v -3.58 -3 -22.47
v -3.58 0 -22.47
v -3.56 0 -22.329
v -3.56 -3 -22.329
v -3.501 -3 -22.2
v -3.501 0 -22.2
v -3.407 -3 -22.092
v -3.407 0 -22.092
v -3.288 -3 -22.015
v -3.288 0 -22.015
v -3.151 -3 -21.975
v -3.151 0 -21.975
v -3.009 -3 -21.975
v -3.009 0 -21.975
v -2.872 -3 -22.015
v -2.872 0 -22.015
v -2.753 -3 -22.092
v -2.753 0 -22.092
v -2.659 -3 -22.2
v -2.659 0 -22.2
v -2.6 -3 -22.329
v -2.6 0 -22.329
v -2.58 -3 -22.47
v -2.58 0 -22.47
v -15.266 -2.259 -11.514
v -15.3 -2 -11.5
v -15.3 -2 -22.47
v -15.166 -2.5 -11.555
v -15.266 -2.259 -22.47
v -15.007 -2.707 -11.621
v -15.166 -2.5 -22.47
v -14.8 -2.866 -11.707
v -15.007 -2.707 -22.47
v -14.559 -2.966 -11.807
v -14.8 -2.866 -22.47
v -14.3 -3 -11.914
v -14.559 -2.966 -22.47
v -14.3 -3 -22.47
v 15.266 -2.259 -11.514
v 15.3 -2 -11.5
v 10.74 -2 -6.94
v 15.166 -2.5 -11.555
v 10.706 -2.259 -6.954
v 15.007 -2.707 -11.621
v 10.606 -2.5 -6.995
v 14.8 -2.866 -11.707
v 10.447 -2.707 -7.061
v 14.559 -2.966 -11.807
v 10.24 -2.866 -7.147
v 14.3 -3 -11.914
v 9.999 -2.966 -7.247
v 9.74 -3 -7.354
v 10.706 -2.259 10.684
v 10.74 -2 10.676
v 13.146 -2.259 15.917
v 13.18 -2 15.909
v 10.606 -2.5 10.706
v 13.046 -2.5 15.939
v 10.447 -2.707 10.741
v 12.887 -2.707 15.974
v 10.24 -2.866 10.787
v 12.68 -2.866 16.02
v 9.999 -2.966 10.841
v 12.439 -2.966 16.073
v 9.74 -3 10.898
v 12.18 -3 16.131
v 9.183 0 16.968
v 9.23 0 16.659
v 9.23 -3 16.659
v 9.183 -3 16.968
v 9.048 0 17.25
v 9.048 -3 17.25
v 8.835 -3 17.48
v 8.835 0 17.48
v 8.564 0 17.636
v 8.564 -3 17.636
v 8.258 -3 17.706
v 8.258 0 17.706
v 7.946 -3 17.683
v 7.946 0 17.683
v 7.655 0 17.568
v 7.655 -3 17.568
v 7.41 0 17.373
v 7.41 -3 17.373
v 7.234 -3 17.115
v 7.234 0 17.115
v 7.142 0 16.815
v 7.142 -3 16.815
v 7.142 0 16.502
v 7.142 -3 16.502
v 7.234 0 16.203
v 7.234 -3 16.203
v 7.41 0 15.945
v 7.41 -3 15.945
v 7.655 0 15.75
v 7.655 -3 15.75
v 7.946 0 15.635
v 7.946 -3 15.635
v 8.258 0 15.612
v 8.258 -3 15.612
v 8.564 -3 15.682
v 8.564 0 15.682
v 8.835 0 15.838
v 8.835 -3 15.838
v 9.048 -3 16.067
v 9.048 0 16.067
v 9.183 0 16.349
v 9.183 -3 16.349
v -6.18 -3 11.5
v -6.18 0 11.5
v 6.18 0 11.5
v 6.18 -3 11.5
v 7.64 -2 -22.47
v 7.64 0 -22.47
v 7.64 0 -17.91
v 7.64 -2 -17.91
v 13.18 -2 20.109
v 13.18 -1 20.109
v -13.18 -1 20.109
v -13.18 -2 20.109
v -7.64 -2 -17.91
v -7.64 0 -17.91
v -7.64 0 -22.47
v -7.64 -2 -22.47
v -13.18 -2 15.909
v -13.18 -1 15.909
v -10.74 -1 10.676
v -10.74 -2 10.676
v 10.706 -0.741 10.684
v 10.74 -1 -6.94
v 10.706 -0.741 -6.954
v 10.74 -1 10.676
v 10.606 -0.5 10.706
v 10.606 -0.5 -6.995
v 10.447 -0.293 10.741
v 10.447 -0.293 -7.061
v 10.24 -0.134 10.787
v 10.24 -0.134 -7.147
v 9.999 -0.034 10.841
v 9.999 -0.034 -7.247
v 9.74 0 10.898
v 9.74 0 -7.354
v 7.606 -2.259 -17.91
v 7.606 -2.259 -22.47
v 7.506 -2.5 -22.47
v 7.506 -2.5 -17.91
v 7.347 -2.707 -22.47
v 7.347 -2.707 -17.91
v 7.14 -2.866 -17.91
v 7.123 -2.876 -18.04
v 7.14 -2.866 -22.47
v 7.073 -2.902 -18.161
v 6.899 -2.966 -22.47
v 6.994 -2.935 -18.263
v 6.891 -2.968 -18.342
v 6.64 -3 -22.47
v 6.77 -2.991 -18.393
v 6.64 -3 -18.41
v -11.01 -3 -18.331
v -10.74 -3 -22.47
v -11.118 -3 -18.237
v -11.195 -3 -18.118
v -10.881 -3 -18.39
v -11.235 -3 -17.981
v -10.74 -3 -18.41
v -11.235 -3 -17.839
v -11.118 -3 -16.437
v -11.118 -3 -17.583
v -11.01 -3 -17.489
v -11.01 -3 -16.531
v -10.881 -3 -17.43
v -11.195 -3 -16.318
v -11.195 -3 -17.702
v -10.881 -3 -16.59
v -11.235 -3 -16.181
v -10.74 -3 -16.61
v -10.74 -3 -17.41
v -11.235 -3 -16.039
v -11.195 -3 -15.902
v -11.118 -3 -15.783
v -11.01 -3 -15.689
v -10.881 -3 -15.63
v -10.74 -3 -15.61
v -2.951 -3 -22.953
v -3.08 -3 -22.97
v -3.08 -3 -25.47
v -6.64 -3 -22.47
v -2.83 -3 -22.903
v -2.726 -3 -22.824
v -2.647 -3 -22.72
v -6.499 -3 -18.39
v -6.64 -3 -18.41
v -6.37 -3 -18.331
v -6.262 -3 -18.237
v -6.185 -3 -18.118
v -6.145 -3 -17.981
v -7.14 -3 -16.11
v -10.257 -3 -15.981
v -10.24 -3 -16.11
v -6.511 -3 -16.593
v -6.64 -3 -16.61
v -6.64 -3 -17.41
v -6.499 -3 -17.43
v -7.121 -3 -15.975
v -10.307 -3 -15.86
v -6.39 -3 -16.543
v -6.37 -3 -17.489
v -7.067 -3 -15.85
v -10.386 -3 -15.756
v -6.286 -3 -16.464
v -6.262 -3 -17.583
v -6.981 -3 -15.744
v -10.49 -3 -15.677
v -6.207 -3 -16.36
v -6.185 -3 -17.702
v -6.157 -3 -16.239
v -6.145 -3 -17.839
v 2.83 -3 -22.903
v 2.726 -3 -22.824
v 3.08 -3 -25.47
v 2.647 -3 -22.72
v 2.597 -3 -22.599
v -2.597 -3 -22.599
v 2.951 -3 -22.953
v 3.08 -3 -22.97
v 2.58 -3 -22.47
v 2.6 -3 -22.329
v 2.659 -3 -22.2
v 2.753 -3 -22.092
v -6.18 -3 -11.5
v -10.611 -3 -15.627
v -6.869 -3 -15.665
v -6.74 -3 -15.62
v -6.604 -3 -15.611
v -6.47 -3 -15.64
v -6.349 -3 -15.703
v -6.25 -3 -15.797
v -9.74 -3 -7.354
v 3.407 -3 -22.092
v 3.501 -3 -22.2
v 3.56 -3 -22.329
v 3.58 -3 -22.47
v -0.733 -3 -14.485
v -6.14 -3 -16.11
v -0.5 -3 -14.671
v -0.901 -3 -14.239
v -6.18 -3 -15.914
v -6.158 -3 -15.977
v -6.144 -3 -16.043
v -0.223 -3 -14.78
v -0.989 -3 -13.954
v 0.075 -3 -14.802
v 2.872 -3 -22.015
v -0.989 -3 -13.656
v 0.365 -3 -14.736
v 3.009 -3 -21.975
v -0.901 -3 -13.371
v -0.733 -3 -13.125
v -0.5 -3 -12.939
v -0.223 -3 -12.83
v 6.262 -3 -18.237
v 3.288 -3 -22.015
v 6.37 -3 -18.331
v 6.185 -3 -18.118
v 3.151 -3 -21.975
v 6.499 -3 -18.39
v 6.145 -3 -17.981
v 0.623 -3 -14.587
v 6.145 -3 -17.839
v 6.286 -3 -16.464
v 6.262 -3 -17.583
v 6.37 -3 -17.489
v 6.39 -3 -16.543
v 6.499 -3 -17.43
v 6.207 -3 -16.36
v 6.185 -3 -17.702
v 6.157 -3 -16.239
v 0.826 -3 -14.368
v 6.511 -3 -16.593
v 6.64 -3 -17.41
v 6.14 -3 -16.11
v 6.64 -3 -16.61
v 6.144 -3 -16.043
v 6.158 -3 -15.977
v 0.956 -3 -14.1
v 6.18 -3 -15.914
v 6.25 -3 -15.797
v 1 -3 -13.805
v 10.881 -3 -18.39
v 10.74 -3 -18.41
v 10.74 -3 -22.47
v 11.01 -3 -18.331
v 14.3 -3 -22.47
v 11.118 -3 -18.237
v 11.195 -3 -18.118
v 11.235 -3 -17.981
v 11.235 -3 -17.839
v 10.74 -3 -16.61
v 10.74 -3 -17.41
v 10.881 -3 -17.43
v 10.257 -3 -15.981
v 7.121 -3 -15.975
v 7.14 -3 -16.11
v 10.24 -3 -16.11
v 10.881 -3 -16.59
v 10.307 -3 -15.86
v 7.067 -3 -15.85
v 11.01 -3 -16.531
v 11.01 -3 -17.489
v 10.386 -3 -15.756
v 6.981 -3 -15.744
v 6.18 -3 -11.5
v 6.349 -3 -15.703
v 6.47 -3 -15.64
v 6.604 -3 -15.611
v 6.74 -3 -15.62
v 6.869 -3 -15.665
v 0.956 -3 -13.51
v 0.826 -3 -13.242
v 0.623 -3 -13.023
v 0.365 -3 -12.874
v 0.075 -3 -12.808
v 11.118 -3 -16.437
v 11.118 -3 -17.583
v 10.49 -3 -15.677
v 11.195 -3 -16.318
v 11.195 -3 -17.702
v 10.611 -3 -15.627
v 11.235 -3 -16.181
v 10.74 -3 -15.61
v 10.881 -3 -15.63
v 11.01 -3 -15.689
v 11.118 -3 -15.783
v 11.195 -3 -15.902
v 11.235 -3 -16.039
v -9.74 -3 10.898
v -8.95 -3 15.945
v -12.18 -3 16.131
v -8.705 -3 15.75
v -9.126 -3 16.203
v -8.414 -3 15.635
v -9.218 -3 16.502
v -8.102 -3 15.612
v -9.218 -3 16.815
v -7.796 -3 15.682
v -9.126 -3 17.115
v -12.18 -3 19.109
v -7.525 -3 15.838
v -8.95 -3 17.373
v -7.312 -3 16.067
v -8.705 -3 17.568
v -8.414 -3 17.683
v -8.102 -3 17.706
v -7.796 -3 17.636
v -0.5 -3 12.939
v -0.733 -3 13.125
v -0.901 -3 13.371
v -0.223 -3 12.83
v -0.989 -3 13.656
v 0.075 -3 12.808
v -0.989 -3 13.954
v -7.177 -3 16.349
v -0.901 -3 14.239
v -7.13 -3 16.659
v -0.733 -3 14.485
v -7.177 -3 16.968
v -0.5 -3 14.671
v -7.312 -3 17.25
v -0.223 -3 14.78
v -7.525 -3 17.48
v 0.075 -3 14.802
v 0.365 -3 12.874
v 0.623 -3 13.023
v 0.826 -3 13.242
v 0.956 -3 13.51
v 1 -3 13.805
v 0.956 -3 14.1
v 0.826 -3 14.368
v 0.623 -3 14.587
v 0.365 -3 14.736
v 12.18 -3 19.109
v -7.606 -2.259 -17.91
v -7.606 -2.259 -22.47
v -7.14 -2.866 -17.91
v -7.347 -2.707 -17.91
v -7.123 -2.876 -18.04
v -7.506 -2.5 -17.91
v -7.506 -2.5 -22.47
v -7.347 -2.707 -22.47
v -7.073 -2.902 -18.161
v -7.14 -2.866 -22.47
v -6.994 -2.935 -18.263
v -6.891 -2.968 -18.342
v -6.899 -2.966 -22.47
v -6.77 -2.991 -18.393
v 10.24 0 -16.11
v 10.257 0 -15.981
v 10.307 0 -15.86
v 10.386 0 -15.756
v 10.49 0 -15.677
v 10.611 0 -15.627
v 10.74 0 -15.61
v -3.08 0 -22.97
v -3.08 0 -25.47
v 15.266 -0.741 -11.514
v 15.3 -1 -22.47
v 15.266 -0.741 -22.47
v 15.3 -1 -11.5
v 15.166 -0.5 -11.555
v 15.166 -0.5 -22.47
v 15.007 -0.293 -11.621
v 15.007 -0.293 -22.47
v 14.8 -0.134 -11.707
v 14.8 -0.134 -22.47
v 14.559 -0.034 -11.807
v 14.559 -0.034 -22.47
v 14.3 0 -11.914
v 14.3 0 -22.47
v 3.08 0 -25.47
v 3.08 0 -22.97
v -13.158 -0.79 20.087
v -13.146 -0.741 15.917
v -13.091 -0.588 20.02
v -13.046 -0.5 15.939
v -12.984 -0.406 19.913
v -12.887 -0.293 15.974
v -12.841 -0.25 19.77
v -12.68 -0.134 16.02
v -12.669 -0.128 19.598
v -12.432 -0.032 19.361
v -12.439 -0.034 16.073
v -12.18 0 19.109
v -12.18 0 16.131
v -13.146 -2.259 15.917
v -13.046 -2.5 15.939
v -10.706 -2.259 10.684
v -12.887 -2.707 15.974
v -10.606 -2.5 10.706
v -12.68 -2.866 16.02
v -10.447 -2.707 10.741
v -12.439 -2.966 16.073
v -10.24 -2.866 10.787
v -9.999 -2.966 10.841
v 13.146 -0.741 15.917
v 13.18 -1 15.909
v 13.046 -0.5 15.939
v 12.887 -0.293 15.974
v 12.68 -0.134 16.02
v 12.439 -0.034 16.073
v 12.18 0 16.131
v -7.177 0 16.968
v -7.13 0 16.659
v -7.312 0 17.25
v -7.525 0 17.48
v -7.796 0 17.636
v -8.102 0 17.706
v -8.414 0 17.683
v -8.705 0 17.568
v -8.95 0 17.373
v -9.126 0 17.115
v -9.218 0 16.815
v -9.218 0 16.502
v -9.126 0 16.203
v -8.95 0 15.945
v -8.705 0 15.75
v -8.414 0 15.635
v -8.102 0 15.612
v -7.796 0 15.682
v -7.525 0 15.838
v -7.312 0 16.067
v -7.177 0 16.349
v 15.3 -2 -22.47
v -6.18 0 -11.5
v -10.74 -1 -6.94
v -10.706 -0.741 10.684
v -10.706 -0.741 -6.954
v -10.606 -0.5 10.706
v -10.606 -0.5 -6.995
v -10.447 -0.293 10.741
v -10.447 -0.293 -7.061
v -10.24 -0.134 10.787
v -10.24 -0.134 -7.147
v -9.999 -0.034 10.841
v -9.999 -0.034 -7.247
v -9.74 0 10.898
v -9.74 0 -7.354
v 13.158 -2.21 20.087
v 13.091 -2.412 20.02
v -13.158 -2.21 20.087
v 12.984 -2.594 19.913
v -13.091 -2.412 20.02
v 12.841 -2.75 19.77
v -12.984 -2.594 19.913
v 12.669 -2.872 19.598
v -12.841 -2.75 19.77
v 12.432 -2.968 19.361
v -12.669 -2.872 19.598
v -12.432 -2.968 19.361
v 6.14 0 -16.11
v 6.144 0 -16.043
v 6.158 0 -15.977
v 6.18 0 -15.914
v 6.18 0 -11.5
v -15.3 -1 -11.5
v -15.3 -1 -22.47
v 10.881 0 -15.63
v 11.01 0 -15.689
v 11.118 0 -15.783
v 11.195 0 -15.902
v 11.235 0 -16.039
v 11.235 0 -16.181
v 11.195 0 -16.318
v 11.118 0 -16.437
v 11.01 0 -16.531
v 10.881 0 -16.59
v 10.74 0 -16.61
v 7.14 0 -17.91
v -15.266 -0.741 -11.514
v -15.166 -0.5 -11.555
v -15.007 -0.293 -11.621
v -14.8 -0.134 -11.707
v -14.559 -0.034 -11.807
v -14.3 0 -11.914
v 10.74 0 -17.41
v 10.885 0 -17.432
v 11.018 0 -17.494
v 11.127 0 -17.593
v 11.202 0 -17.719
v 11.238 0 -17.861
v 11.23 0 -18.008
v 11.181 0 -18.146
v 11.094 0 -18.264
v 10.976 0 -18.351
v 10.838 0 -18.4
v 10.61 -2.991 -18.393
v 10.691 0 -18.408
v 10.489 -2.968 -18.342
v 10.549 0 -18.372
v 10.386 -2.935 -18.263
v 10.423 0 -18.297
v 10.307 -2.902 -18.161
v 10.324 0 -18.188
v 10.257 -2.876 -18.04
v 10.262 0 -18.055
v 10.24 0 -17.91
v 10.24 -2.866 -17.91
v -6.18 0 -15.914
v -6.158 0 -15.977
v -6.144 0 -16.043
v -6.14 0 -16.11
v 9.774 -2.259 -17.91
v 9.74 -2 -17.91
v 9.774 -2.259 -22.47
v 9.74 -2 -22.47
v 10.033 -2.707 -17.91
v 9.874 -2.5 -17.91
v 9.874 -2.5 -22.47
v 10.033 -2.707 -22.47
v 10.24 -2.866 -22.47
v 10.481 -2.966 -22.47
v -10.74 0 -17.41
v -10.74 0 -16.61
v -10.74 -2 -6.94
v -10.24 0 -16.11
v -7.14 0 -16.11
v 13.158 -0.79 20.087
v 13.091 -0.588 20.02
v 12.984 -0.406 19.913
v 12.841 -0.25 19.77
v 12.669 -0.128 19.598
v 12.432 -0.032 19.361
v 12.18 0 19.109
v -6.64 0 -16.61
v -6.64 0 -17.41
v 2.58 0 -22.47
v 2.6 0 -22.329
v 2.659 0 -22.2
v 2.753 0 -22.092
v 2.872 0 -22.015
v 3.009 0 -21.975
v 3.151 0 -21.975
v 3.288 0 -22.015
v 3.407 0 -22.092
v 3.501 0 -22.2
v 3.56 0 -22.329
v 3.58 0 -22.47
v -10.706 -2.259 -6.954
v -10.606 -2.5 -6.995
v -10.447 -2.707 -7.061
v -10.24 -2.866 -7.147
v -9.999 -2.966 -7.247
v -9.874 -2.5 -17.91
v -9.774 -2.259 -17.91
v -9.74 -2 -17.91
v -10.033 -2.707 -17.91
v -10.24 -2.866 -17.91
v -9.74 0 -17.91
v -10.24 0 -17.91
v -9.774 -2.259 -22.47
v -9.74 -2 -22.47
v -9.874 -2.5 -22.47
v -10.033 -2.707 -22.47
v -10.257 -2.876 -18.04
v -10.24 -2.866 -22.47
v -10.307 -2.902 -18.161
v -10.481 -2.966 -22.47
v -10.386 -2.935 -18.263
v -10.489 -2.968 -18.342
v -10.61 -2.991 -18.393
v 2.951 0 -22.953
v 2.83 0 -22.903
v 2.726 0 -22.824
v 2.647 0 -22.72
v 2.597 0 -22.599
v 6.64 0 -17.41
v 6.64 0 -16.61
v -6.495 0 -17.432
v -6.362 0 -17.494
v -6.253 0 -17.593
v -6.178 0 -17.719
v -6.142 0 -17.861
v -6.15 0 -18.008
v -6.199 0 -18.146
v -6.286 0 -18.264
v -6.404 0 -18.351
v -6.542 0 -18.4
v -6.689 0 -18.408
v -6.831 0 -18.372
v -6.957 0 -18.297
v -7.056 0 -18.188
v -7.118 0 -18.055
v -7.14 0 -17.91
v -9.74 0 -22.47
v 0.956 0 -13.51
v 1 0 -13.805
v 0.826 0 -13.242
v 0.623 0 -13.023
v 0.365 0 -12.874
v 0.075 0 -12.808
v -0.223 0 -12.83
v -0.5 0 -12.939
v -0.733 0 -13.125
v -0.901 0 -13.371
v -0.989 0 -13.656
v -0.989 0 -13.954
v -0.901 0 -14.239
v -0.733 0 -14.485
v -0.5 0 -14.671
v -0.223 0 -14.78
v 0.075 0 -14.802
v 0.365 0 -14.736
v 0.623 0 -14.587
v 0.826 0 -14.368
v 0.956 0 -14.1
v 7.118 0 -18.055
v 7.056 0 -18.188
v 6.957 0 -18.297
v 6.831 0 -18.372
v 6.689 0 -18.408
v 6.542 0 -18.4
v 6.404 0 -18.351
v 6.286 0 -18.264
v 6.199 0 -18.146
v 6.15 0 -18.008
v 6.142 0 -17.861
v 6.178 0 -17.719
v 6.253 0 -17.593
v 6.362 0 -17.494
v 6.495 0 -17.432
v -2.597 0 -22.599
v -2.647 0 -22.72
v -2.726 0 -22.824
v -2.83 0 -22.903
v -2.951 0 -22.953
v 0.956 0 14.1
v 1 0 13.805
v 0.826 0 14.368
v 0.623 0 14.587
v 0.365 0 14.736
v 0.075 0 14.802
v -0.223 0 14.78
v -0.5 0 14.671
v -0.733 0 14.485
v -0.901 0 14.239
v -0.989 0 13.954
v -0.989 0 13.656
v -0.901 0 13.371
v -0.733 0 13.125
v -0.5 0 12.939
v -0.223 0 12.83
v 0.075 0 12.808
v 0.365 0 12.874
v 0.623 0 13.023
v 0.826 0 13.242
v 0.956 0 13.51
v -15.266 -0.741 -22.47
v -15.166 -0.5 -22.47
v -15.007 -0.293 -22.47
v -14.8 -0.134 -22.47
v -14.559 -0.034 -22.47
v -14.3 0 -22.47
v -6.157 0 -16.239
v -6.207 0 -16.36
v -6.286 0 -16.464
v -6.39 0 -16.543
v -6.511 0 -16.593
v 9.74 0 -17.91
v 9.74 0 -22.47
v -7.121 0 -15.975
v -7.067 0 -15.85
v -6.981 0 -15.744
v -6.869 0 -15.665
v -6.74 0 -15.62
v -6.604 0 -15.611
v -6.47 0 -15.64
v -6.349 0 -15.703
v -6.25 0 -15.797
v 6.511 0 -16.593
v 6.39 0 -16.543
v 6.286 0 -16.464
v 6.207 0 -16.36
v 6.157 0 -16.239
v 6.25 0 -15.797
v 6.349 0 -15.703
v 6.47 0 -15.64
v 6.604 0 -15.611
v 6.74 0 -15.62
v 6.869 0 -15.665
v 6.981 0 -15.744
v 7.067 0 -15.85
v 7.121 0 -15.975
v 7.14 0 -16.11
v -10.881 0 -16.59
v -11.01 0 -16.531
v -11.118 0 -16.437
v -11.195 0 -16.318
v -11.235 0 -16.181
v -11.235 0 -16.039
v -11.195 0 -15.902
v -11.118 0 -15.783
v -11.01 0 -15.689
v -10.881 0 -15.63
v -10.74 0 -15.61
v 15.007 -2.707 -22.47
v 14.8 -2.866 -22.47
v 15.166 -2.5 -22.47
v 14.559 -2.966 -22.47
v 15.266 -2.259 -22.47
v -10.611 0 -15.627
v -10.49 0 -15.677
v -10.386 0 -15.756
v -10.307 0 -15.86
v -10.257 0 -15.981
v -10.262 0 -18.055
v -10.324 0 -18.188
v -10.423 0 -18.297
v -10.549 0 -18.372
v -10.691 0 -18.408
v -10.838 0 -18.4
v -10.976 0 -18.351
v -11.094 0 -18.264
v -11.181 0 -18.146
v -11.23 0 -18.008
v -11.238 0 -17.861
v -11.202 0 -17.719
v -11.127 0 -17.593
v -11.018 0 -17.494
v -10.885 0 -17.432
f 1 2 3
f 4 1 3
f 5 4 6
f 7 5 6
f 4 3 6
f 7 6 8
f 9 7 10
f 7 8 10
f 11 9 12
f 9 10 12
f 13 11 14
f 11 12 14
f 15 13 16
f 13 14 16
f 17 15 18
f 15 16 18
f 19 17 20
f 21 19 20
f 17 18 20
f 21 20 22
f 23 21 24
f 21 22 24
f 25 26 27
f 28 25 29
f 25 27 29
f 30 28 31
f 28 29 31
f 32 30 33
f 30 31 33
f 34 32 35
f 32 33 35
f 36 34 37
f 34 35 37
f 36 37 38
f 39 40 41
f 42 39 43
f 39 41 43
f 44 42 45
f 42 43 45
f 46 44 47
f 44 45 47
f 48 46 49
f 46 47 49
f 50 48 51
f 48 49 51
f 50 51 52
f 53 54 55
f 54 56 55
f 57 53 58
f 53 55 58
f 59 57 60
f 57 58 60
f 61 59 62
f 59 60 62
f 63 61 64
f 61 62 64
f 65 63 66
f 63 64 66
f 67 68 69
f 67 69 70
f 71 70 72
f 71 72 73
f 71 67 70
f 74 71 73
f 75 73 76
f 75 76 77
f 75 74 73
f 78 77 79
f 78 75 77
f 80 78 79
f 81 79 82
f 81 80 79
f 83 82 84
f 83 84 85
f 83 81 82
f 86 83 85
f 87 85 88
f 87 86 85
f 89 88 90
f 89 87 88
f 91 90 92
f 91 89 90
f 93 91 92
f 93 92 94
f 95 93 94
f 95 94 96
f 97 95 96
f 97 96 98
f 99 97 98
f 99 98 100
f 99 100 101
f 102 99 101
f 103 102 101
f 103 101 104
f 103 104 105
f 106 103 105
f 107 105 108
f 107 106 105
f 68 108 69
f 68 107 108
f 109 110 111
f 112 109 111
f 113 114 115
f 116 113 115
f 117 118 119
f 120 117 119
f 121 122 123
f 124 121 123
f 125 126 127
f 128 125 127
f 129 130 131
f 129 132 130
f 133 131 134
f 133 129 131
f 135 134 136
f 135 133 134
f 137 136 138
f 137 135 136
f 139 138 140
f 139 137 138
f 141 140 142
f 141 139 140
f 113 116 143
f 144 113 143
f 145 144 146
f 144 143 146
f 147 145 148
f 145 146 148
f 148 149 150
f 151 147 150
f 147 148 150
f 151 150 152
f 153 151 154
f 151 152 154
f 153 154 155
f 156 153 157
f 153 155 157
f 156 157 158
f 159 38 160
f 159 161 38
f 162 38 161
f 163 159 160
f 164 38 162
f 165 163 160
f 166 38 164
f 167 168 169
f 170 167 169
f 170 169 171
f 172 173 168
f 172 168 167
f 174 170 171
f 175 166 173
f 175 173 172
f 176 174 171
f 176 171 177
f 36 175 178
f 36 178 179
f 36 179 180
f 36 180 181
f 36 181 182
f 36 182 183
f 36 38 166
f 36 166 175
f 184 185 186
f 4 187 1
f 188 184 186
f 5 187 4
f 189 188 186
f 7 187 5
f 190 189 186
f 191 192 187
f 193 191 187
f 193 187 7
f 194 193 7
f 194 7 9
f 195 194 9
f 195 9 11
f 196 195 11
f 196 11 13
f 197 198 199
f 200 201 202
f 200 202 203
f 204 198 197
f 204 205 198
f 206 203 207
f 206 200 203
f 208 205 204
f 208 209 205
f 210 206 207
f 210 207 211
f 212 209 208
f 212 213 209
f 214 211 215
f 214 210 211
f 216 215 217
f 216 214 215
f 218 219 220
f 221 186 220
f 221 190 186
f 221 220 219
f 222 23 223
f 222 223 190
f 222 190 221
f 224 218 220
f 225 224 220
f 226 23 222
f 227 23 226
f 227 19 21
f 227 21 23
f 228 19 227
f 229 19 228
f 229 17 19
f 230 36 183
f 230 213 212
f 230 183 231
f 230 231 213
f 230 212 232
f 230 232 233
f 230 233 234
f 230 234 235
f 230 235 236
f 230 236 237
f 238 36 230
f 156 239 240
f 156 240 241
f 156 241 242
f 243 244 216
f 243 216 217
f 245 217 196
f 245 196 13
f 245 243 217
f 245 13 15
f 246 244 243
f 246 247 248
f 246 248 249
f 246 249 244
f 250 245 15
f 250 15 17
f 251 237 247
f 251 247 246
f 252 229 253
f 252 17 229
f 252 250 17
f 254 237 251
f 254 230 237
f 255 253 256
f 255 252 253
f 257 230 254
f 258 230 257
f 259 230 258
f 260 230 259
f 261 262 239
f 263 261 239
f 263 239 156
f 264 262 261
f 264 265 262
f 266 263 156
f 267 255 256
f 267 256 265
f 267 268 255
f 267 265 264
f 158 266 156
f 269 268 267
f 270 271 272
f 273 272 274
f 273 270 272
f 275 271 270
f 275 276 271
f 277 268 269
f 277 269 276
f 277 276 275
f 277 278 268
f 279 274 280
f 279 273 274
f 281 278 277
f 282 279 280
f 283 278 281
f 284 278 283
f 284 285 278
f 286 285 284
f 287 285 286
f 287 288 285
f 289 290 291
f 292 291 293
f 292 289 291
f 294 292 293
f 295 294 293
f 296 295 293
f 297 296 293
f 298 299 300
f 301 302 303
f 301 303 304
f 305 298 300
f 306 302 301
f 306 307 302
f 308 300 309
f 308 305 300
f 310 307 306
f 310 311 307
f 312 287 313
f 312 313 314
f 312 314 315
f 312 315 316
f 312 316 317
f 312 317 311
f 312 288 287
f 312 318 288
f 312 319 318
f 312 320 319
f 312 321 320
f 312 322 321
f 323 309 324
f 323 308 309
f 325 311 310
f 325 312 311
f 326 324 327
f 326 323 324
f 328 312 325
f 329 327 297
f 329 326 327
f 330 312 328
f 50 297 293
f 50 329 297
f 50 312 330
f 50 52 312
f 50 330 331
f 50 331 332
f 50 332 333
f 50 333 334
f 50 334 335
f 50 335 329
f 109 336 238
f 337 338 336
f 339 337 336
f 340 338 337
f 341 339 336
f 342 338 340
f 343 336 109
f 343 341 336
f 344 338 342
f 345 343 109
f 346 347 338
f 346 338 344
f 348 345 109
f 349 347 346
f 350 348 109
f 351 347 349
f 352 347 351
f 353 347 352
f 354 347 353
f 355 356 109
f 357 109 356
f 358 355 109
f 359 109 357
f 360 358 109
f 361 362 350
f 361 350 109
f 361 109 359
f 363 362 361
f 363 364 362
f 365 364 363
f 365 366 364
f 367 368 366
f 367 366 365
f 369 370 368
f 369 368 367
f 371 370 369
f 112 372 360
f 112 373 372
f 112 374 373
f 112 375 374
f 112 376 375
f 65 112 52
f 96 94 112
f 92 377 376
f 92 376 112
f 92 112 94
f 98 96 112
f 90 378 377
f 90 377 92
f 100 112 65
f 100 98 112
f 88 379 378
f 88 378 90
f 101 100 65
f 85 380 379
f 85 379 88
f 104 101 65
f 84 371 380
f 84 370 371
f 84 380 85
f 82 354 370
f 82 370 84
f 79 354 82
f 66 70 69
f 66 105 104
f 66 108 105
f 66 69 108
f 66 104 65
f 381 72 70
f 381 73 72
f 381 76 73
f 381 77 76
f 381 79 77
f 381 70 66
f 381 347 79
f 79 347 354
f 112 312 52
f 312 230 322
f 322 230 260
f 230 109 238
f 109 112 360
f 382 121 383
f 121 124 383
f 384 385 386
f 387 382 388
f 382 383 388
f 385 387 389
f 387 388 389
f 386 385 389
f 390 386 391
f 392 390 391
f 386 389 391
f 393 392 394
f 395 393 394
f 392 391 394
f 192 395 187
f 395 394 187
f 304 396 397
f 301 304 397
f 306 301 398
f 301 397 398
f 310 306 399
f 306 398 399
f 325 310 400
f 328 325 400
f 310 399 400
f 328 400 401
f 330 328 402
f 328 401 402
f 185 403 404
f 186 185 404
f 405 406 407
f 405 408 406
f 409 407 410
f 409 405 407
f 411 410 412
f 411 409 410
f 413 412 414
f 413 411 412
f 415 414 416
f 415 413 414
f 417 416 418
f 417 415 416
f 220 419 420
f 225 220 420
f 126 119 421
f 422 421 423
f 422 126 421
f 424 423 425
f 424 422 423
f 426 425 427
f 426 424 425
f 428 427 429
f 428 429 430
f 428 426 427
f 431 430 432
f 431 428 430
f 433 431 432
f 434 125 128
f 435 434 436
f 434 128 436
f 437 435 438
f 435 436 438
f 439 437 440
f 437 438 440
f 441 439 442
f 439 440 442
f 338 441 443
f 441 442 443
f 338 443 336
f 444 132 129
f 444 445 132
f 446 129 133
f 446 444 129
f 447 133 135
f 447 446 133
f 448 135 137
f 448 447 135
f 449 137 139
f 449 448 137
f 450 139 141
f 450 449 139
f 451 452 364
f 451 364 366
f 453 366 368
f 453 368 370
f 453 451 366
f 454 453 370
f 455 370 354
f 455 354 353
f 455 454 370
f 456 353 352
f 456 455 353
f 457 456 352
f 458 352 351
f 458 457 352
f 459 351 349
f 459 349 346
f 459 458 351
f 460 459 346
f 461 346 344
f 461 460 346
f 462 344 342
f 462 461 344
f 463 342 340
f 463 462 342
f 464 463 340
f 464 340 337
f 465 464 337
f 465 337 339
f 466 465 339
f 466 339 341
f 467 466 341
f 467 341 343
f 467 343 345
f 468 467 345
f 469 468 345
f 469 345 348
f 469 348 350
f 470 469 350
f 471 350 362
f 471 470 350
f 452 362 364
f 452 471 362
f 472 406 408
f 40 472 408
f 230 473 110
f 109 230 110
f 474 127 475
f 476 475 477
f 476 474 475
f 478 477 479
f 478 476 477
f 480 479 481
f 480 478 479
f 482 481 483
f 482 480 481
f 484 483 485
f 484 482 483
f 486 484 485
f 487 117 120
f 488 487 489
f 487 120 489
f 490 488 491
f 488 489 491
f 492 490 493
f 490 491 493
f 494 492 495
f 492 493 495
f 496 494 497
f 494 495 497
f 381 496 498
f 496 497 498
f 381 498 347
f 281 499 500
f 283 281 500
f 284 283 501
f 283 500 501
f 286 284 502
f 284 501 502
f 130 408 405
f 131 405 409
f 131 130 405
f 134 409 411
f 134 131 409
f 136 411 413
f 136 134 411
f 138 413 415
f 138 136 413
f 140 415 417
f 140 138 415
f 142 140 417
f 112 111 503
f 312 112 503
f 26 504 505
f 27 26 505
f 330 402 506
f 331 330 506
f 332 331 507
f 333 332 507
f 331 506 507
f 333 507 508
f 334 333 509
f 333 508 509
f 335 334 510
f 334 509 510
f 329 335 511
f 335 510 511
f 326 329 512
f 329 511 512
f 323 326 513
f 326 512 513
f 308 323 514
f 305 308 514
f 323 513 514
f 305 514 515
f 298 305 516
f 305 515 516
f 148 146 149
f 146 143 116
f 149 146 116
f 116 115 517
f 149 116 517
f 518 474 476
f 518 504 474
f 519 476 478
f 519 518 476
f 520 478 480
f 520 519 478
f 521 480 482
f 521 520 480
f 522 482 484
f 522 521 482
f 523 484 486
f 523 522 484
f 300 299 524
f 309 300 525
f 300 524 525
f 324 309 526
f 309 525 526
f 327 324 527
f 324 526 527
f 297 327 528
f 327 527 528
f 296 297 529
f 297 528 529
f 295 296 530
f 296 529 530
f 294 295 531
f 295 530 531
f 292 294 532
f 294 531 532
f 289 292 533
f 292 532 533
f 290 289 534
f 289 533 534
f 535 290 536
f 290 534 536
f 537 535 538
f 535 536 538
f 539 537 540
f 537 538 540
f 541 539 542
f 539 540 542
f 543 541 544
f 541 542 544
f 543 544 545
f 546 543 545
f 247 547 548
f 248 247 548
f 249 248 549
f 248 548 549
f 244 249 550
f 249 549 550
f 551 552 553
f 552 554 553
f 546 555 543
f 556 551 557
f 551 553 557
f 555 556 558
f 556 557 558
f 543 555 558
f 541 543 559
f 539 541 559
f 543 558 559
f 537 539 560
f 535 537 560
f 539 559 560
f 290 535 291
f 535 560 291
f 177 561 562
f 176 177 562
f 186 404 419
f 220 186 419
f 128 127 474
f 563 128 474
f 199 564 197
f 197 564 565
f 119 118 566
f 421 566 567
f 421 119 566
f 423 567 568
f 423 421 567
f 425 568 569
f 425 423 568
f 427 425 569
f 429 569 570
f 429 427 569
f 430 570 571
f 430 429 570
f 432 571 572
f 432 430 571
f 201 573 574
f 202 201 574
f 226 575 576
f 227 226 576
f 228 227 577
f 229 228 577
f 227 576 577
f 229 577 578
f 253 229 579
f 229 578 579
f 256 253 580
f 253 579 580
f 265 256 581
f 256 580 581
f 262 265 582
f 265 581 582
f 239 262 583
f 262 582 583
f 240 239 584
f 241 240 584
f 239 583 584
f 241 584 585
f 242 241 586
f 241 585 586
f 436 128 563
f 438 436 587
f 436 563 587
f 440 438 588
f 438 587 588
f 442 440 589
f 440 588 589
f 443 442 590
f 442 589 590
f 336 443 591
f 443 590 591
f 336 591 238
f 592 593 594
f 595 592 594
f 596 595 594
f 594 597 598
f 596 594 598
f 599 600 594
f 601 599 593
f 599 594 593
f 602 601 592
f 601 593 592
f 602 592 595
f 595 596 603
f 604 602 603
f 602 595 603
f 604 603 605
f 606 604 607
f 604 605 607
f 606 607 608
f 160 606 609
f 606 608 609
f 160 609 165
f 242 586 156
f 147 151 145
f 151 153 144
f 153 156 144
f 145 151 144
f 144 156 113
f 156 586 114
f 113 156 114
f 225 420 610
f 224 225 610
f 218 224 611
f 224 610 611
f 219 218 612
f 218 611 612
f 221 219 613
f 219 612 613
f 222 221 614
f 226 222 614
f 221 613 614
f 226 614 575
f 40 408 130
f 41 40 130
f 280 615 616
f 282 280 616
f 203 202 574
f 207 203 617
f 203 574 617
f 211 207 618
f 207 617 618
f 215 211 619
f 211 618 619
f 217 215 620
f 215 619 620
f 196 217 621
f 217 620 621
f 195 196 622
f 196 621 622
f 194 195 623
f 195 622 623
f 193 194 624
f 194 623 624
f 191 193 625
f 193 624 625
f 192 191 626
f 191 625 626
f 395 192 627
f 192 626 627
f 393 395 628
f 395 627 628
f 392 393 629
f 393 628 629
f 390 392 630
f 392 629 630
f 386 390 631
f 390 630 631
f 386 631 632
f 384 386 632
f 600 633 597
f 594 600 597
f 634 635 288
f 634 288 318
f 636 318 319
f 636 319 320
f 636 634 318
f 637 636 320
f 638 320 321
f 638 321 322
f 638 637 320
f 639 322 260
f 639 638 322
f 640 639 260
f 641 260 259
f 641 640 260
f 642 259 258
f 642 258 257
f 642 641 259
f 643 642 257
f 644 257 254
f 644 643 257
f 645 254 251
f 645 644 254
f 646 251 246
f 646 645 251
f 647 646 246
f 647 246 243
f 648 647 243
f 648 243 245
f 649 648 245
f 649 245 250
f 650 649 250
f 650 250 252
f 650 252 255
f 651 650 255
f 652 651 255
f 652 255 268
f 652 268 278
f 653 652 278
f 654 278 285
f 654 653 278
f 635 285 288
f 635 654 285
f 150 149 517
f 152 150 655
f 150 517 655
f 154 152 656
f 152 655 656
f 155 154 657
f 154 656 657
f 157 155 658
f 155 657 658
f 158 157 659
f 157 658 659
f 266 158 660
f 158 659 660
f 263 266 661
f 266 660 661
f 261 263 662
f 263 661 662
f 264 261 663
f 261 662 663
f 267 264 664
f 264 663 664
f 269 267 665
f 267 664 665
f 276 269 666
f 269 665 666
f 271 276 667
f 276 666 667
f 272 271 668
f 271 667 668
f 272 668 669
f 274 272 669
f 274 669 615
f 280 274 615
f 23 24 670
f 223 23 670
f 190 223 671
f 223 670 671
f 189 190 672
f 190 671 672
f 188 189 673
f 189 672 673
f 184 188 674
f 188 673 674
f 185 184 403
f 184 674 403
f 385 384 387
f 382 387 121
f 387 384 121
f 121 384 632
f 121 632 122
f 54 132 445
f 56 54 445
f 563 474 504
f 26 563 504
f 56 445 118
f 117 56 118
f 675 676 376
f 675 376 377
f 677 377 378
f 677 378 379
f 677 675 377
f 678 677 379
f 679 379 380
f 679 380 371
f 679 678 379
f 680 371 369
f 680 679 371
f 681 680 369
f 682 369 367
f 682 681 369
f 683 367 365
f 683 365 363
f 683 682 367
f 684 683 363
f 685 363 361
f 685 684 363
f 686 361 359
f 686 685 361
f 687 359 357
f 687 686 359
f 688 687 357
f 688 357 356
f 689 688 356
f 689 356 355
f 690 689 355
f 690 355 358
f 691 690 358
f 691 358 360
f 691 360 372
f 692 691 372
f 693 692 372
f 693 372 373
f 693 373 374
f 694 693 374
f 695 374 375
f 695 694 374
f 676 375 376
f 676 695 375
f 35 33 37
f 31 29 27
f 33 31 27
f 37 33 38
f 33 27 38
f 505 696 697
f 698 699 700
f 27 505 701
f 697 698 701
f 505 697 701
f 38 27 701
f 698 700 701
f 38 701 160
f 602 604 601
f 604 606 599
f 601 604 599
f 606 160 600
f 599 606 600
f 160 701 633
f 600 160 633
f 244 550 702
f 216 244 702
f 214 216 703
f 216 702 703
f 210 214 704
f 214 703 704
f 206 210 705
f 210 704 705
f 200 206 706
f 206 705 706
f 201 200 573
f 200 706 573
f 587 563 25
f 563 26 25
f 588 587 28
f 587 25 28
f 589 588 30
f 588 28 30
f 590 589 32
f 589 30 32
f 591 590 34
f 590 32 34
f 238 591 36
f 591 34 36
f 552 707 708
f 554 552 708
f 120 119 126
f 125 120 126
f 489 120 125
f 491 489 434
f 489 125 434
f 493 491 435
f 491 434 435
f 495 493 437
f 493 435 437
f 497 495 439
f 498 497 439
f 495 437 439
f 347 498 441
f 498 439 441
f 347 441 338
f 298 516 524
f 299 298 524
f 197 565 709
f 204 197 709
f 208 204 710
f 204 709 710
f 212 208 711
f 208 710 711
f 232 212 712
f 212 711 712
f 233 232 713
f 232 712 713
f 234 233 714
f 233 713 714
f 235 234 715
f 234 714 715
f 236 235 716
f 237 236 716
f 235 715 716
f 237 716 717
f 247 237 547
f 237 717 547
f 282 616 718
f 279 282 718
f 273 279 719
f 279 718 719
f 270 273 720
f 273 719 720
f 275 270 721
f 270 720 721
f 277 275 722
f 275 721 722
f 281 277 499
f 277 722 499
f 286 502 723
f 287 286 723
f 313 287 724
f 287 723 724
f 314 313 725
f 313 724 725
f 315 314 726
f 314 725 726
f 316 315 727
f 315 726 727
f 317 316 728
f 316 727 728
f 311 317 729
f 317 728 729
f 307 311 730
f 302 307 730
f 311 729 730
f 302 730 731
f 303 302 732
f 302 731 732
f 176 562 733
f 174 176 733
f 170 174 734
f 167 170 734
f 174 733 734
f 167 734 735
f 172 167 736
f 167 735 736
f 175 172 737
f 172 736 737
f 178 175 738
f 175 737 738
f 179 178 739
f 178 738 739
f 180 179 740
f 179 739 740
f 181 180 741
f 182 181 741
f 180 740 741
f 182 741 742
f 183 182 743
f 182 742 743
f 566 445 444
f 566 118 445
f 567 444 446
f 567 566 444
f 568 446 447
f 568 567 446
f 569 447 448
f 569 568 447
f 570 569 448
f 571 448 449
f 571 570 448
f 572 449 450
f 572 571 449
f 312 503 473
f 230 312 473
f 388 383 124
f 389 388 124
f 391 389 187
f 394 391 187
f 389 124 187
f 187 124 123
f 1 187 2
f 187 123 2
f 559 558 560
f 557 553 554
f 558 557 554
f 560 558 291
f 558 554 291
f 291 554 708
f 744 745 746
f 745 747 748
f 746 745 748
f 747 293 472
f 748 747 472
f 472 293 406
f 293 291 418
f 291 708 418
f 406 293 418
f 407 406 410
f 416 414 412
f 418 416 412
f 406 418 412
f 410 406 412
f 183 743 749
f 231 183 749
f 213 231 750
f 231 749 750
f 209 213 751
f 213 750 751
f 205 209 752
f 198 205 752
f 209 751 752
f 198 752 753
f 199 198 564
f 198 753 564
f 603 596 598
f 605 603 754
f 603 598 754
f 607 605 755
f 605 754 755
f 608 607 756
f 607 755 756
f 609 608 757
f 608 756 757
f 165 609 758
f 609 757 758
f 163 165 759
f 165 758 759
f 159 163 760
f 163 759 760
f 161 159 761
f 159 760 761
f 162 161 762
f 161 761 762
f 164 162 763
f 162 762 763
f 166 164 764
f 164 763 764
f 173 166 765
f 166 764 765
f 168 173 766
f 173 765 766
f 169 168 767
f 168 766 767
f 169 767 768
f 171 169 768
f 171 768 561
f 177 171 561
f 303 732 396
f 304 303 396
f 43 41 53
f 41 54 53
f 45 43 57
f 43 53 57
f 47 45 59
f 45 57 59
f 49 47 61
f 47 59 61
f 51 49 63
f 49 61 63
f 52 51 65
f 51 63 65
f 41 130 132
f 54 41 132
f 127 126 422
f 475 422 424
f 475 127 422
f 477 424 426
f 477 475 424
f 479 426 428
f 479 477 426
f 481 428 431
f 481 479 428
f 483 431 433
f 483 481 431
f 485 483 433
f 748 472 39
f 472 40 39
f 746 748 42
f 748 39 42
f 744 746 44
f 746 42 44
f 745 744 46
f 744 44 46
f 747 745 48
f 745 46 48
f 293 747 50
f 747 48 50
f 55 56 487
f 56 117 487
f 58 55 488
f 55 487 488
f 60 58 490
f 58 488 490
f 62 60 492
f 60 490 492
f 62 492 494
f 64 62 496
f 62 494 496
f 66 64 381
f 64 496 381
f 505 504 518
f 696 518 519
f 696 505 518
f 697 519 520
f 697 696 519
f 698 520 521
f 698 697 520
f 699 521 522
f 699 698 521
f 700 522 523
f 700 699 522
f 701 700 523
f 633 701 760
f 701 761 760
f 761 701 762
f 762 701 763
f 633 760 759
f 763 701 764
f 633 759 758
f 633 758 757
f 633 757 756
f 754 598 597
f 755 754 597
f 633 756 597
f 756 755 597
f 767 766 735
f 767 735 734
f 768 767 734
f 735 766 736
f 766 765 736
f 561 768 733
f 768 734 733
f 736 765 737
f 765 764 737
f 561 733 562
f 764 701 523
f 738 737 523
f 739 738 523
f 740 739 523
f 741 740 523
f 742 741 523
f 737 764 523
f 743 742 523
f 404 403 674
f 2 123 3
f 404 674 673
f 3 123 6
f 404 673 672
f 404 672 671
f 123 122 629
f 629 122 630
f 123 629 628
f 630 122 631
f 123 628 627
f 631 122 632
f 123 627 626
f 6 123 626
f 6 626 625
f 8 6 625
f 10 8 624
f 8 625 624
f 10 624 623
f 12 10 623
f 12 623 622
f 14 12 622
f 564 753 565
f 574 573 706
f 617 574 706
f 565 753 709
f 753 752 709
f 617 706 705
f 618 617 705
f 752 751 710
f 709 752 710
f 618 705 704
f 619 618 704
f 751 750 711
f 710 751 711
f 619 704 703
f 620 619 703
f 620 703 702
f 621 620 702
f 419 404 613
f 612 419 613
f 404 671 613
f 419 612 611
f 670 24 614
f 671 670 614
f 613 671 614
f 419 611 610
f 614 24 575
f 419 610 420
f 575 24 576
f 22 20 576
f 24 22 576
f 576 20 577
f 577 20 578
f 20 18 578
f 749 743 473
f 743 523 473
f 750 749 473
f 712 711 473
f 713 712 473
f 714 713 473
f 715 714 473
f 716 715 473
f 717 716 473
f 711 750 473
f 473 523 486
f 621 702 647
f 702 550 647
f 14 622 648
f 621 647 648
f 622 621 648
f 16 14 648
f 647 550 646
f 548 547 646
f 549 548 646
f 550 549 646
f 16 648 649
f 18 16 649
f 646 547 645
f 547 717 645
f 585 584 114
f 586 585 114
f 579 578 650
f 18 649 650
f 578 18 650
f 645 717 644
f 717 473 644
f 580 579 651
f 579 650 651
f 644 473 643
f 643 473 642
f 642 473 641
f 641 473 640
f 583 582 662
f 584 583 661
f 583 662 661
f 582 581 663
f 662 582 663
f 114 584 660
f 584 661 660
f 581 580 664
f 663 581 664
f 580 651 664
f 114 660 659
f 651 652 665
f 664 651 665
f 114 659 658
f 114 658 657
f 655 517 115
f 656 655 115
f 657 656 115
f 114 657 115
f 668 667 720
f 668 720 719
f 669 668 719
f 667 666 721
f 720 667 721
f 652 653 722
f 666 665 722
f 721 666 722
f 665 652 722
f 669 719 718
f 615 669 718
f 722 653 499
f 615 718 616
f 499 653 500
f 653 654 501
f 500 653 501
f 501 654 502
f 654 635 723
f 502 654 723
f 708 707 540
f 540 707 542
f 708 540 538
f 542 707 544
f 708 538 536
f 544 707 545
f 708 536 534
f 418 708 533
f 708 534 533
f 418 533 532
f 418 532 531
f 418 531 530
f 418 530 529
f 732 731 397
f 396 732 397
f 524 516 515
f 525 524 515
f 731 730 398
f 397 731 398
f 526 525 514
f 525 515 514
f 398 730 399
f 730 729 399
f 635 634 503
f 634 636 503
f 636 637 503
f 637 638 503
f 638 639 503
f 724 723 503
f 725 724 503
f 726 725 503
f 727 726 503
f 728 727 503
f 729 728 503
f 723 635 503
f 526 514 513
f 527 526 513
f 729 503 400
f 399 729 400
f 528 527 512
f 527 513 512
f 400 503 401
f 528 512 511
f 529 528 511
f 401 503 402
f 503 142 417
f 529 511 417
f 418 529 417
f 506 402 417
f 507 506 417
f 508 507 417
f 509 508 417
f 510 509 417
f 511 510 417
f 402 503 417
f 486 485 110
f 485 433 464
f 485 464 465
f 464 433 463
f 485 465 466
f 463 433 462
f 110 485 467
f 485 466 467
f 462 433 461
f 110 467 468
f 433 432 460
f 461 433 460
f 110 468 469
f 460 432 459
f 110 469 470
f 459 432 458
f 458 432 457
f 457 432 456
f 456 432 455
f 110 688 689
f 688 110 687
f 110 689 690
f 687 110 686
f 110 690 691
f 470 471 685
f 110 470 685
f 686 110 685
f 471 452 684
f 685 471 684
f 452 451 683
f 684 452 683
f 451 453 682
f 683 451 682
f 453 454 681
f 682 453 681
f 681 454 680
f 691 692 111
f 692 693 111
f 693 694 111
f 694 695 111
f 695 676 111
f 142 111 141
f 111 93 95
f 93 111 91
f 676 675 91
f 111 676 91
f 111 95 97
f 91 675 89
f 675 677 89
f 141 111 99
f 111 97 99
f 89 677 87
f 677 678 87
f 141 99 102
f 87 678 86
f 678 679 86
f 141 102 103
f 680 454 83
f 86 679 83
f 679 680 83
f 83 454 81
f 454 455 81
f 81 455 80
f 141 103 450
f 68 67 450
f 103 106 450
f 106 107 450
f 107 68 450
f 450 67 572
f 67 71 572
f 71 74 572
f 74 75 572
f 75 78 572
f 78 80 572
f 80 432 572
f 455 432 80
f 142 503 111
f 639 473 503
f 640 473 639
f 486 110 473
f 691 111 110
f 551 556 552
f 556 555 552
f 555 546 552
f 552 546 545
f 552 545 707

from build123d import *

# Parameters (mm, degrees)
F0_R     = 1.05
F0_R_2   = 1
F1_DEPTH = 3
F2_R     = 1


# Not quite as in the source:
# - a feature names something its author has since deleted; it is built from what else it names


with BuildPart() as f1:
    # F0 (on Front) → F1 (new body)
    with BuildSketch(Plane.XZ):
        with BuildLine():
            ThreePointArc((3.08, -22.97), (2.7264466094, -22.8235533906), (2.58, -22.47))
            Line((2.58, -22.47), (-2.58, -22.47))
            ThreePointArc((-2.58, -22.47), (-2.7264466094, -22.8235533906), (-3.08, -22.97))
            Line((-3.08, -22.97), (-3.08, -25.47))
            Line((-3.08, -25.47), (3.08, -25.47))
            Line((3.08, -25.47), (3.08, -22.97))
        make_face()
        Polygon((10.74, -6.94), (10.74, -11.5), (15.3, -11.5), align=None)
        Polygon((-15.3, -11.5), (-10.74, -11.5), (-10.74, -6.94), align=None)
        with BuildLine():
            Line((10.74, -11.5), (10.74, -15.61))
            ThreePointArc((10.74, -15.61), (11.24, -16.11), (10.74, -16.61))
            Line((10.74, -16.61), (10.74, -17.41))
            ThreePointArc((10.74, -17.41), (11.0935533906, -18.2635533906), (10.24, -17.91))
            Line((10.24, -17.91), (9.74, -17.91))
            Line((9.74, -17.91), (9.74, -22.47))
            Line((9.74, -22.47), (15.3, -22.47))
            Line((15.3, -22.47), (15.3, -11.5))
            Line((15.3, -11.5), (10.74, -11.5))
        make_face()
        with BuildLine():
            Line((-10.74, -15.61), (-10.74, -11.5))
            Line((-10.74, -11.5), (-15.3, -11.5))
            Line((-15.3, -11.5), (-15.3, -22.47))
            Line((-15.3, -22.47), (-9.74, -22.47))
            Line((-9.74, -22.47), (-9.74, -17.91))
            Line((-9.74, -17.91), (-10.24, -17.91))
            ThreePointArc((-10.24, -17.91), (-11.0935533906, -18.2635533906), (-10.74, -17.41))
            Line((-10.74, -17.41), (-10.74, -16.61))
            ThreePointArc((-10.74, -16.61), (-11.24, -16.11), (-10.74, -15.61))
        make_face()
        Polygon((6.18, -11.5), (10.74, -11.5), (10.74, -6.94), (10.74, 10.6763684678), (13.18, 15.9089653538), (13.18, 20.1089653538), (-13.18, 20.1089653538), (-13.18, 15.9089653538), (-10.74, 10.6763684678), (-10.74, -6.94), (-10.74, -11.5), (-6.18, -11.5), (-6.18, 11.5), (6.18, 11.5), align=None)
        with Locations((-8.18, 16.6589653538)):
            Circle(F0_R, mode=Mode.SUBTRACT)
        with Locations((0, 13.805)):
            Circle(F0_R_2, mode=Mode.SUBTRACT)
        with Locations((8.18, 16.6589653538)):
            Circle(F0_R, mode=Mode.SUBTRACT)
        with BuildLine():
            ThreePointArc((6.64, -16.61), (6.2864466094, -16.4635533906), (6.14, -16.11))
            Line((6.14, -16.11), (-6.14, -16.11))
            ThreePointArc((-6.14, -16.11), (-6.2864466094, -16.4635533906), (-6.64, -16.61))
            Line((-6.64, -16.61), (-6.64, -17.41))
            ThreePointArc((-6.64, -17.41), (-6.2864466094, -18.2635533906), (-7.14, -17.91))
            Line((-7.14, -17.91), (-7.64, -17.91))
            Line((-7.64, -17.91), (-7.64, -22.47))
            Line((-7.64, -22.47), (-3.58, -22.47))
            ThreePointArc((-3.58, -22.47), (-3.08, -21.97), (-2.58, -22.47))
            Line((-2.58, -22.47), (2.58, -22.47))
            ThreePointArc((2.58, -22.47), (3.08, -21.97), (3.58, -22.47))
            Line((3.58, -22.47), (7.64, -22.47))
            Line((7.64, -22.47), (7.64, -17.91))
            Line((7.64, -17.91), (7.14, -17.91))
            ThreePointArc((7.14, -17.91), (6.2864466094, -18.2635533906), (6.64, -17.41))
            Line((6.64, -17.41), (6.64, -16.61))
        make_face()
        with BuildLine():
            ThreePointArc((6.14, -16.11), (6.1501020514, -16.01), (6.18, -15.9140408206))
            Line((6.18, -15.9140408206), (6.18, -11.5))
            Line((6.18, -11.5), (-6.18, -11.5))
            Line((-6.18, -11.5), (-6.18, -15.9140408206))
            ThreePointArc((-6.18, -15.9140408206), (-6.1501020514, -16.01), (-6.14, -16.11))
            Line((-6.14, -16.11), (6.14, -16.11))
        make_face()
        with Locations((0, -13.805)):
            Circle(F0_R_2, mode=Mode.SUBTRACT)
        with BuildLine():
            Line((-6.18, -15.9140408206), (-6.18, -11.5))
            Line((-6.18, -11.5), (-10.74, -11.5))
            Line((-10.74, -11.5), (-10.74, -15.61))
            ThreePointArc((-10.74, -15.61), (-10.3864466094, -15.7564466094), (-10.24, -16.11))
            Line((-10.24, -16.11), (-7.14, -16.11))
            ThreePointArc((-7.14, -16.11), (-6.74, -15.6201020514), (-6.18, -15.9140408206))
        make_face()
        with BuildLine():
            Line((7.14, -16.11), (10.24, -16.11))
            ThreePointArc((10.24, -16.11), (10.3864466094, -15.7564466094), (10.74, -15.61))
            Line((10.74, -15.61), (10.74, -11.5))
            Line((10.74, -11.5), (6.18, -11.5))
            Line((6.18, -11.5), (6.18, -15.9140408206))
            ThreePointArc((6.18, -15.9140408206), (6.74, -15.6201020514), (7.14, -16.11))
        make_face()
    extrude(amount=F1_DEPTH)

    # F2
    f2_edges = [f1.edges().sort_by_distance(p)[0] for p in [
        (0, -3, 20.108965),
        (-13.18, -3, 18.008965),
        (-11.96, -3, 13.292667),
        (-10.74, -3, 1.868184),
        (-13.02, -3, -9.22),
        (-15.3, -3, -16.985),
        (15.3, -3, -16.985),
        (13.02, -3, -9.22),
        (10.74, -3, 1.868184),
        (11.96, -3, 13.292667),
        (13.18, -3, 18.008965),
        (7.64, -3, -20.19),
        (9.74, -3, -20.19),
        (-7.64, -3, -20.19),
        (-9.74, -3, -20.19),
        (0, 0, 20.108965),
        (13.18, 0, 18.008965),
        (11.96, 0, 13.292667),
        (-13.18, 0, 18.008965),
        (-11.96, 0, 13.292667),
        (-10.74, 0, 1.868184),
        (-13.02, 0, -9.22),
        (-15.3, 0, -16.985),
        (15.3, 0, -16.985),
        (13.02, 0, -9.22),
        (10.74, 0, 1.868184),
    ]]
    fillet(f2_edges, radius=F2_R)


solid = f1.part
